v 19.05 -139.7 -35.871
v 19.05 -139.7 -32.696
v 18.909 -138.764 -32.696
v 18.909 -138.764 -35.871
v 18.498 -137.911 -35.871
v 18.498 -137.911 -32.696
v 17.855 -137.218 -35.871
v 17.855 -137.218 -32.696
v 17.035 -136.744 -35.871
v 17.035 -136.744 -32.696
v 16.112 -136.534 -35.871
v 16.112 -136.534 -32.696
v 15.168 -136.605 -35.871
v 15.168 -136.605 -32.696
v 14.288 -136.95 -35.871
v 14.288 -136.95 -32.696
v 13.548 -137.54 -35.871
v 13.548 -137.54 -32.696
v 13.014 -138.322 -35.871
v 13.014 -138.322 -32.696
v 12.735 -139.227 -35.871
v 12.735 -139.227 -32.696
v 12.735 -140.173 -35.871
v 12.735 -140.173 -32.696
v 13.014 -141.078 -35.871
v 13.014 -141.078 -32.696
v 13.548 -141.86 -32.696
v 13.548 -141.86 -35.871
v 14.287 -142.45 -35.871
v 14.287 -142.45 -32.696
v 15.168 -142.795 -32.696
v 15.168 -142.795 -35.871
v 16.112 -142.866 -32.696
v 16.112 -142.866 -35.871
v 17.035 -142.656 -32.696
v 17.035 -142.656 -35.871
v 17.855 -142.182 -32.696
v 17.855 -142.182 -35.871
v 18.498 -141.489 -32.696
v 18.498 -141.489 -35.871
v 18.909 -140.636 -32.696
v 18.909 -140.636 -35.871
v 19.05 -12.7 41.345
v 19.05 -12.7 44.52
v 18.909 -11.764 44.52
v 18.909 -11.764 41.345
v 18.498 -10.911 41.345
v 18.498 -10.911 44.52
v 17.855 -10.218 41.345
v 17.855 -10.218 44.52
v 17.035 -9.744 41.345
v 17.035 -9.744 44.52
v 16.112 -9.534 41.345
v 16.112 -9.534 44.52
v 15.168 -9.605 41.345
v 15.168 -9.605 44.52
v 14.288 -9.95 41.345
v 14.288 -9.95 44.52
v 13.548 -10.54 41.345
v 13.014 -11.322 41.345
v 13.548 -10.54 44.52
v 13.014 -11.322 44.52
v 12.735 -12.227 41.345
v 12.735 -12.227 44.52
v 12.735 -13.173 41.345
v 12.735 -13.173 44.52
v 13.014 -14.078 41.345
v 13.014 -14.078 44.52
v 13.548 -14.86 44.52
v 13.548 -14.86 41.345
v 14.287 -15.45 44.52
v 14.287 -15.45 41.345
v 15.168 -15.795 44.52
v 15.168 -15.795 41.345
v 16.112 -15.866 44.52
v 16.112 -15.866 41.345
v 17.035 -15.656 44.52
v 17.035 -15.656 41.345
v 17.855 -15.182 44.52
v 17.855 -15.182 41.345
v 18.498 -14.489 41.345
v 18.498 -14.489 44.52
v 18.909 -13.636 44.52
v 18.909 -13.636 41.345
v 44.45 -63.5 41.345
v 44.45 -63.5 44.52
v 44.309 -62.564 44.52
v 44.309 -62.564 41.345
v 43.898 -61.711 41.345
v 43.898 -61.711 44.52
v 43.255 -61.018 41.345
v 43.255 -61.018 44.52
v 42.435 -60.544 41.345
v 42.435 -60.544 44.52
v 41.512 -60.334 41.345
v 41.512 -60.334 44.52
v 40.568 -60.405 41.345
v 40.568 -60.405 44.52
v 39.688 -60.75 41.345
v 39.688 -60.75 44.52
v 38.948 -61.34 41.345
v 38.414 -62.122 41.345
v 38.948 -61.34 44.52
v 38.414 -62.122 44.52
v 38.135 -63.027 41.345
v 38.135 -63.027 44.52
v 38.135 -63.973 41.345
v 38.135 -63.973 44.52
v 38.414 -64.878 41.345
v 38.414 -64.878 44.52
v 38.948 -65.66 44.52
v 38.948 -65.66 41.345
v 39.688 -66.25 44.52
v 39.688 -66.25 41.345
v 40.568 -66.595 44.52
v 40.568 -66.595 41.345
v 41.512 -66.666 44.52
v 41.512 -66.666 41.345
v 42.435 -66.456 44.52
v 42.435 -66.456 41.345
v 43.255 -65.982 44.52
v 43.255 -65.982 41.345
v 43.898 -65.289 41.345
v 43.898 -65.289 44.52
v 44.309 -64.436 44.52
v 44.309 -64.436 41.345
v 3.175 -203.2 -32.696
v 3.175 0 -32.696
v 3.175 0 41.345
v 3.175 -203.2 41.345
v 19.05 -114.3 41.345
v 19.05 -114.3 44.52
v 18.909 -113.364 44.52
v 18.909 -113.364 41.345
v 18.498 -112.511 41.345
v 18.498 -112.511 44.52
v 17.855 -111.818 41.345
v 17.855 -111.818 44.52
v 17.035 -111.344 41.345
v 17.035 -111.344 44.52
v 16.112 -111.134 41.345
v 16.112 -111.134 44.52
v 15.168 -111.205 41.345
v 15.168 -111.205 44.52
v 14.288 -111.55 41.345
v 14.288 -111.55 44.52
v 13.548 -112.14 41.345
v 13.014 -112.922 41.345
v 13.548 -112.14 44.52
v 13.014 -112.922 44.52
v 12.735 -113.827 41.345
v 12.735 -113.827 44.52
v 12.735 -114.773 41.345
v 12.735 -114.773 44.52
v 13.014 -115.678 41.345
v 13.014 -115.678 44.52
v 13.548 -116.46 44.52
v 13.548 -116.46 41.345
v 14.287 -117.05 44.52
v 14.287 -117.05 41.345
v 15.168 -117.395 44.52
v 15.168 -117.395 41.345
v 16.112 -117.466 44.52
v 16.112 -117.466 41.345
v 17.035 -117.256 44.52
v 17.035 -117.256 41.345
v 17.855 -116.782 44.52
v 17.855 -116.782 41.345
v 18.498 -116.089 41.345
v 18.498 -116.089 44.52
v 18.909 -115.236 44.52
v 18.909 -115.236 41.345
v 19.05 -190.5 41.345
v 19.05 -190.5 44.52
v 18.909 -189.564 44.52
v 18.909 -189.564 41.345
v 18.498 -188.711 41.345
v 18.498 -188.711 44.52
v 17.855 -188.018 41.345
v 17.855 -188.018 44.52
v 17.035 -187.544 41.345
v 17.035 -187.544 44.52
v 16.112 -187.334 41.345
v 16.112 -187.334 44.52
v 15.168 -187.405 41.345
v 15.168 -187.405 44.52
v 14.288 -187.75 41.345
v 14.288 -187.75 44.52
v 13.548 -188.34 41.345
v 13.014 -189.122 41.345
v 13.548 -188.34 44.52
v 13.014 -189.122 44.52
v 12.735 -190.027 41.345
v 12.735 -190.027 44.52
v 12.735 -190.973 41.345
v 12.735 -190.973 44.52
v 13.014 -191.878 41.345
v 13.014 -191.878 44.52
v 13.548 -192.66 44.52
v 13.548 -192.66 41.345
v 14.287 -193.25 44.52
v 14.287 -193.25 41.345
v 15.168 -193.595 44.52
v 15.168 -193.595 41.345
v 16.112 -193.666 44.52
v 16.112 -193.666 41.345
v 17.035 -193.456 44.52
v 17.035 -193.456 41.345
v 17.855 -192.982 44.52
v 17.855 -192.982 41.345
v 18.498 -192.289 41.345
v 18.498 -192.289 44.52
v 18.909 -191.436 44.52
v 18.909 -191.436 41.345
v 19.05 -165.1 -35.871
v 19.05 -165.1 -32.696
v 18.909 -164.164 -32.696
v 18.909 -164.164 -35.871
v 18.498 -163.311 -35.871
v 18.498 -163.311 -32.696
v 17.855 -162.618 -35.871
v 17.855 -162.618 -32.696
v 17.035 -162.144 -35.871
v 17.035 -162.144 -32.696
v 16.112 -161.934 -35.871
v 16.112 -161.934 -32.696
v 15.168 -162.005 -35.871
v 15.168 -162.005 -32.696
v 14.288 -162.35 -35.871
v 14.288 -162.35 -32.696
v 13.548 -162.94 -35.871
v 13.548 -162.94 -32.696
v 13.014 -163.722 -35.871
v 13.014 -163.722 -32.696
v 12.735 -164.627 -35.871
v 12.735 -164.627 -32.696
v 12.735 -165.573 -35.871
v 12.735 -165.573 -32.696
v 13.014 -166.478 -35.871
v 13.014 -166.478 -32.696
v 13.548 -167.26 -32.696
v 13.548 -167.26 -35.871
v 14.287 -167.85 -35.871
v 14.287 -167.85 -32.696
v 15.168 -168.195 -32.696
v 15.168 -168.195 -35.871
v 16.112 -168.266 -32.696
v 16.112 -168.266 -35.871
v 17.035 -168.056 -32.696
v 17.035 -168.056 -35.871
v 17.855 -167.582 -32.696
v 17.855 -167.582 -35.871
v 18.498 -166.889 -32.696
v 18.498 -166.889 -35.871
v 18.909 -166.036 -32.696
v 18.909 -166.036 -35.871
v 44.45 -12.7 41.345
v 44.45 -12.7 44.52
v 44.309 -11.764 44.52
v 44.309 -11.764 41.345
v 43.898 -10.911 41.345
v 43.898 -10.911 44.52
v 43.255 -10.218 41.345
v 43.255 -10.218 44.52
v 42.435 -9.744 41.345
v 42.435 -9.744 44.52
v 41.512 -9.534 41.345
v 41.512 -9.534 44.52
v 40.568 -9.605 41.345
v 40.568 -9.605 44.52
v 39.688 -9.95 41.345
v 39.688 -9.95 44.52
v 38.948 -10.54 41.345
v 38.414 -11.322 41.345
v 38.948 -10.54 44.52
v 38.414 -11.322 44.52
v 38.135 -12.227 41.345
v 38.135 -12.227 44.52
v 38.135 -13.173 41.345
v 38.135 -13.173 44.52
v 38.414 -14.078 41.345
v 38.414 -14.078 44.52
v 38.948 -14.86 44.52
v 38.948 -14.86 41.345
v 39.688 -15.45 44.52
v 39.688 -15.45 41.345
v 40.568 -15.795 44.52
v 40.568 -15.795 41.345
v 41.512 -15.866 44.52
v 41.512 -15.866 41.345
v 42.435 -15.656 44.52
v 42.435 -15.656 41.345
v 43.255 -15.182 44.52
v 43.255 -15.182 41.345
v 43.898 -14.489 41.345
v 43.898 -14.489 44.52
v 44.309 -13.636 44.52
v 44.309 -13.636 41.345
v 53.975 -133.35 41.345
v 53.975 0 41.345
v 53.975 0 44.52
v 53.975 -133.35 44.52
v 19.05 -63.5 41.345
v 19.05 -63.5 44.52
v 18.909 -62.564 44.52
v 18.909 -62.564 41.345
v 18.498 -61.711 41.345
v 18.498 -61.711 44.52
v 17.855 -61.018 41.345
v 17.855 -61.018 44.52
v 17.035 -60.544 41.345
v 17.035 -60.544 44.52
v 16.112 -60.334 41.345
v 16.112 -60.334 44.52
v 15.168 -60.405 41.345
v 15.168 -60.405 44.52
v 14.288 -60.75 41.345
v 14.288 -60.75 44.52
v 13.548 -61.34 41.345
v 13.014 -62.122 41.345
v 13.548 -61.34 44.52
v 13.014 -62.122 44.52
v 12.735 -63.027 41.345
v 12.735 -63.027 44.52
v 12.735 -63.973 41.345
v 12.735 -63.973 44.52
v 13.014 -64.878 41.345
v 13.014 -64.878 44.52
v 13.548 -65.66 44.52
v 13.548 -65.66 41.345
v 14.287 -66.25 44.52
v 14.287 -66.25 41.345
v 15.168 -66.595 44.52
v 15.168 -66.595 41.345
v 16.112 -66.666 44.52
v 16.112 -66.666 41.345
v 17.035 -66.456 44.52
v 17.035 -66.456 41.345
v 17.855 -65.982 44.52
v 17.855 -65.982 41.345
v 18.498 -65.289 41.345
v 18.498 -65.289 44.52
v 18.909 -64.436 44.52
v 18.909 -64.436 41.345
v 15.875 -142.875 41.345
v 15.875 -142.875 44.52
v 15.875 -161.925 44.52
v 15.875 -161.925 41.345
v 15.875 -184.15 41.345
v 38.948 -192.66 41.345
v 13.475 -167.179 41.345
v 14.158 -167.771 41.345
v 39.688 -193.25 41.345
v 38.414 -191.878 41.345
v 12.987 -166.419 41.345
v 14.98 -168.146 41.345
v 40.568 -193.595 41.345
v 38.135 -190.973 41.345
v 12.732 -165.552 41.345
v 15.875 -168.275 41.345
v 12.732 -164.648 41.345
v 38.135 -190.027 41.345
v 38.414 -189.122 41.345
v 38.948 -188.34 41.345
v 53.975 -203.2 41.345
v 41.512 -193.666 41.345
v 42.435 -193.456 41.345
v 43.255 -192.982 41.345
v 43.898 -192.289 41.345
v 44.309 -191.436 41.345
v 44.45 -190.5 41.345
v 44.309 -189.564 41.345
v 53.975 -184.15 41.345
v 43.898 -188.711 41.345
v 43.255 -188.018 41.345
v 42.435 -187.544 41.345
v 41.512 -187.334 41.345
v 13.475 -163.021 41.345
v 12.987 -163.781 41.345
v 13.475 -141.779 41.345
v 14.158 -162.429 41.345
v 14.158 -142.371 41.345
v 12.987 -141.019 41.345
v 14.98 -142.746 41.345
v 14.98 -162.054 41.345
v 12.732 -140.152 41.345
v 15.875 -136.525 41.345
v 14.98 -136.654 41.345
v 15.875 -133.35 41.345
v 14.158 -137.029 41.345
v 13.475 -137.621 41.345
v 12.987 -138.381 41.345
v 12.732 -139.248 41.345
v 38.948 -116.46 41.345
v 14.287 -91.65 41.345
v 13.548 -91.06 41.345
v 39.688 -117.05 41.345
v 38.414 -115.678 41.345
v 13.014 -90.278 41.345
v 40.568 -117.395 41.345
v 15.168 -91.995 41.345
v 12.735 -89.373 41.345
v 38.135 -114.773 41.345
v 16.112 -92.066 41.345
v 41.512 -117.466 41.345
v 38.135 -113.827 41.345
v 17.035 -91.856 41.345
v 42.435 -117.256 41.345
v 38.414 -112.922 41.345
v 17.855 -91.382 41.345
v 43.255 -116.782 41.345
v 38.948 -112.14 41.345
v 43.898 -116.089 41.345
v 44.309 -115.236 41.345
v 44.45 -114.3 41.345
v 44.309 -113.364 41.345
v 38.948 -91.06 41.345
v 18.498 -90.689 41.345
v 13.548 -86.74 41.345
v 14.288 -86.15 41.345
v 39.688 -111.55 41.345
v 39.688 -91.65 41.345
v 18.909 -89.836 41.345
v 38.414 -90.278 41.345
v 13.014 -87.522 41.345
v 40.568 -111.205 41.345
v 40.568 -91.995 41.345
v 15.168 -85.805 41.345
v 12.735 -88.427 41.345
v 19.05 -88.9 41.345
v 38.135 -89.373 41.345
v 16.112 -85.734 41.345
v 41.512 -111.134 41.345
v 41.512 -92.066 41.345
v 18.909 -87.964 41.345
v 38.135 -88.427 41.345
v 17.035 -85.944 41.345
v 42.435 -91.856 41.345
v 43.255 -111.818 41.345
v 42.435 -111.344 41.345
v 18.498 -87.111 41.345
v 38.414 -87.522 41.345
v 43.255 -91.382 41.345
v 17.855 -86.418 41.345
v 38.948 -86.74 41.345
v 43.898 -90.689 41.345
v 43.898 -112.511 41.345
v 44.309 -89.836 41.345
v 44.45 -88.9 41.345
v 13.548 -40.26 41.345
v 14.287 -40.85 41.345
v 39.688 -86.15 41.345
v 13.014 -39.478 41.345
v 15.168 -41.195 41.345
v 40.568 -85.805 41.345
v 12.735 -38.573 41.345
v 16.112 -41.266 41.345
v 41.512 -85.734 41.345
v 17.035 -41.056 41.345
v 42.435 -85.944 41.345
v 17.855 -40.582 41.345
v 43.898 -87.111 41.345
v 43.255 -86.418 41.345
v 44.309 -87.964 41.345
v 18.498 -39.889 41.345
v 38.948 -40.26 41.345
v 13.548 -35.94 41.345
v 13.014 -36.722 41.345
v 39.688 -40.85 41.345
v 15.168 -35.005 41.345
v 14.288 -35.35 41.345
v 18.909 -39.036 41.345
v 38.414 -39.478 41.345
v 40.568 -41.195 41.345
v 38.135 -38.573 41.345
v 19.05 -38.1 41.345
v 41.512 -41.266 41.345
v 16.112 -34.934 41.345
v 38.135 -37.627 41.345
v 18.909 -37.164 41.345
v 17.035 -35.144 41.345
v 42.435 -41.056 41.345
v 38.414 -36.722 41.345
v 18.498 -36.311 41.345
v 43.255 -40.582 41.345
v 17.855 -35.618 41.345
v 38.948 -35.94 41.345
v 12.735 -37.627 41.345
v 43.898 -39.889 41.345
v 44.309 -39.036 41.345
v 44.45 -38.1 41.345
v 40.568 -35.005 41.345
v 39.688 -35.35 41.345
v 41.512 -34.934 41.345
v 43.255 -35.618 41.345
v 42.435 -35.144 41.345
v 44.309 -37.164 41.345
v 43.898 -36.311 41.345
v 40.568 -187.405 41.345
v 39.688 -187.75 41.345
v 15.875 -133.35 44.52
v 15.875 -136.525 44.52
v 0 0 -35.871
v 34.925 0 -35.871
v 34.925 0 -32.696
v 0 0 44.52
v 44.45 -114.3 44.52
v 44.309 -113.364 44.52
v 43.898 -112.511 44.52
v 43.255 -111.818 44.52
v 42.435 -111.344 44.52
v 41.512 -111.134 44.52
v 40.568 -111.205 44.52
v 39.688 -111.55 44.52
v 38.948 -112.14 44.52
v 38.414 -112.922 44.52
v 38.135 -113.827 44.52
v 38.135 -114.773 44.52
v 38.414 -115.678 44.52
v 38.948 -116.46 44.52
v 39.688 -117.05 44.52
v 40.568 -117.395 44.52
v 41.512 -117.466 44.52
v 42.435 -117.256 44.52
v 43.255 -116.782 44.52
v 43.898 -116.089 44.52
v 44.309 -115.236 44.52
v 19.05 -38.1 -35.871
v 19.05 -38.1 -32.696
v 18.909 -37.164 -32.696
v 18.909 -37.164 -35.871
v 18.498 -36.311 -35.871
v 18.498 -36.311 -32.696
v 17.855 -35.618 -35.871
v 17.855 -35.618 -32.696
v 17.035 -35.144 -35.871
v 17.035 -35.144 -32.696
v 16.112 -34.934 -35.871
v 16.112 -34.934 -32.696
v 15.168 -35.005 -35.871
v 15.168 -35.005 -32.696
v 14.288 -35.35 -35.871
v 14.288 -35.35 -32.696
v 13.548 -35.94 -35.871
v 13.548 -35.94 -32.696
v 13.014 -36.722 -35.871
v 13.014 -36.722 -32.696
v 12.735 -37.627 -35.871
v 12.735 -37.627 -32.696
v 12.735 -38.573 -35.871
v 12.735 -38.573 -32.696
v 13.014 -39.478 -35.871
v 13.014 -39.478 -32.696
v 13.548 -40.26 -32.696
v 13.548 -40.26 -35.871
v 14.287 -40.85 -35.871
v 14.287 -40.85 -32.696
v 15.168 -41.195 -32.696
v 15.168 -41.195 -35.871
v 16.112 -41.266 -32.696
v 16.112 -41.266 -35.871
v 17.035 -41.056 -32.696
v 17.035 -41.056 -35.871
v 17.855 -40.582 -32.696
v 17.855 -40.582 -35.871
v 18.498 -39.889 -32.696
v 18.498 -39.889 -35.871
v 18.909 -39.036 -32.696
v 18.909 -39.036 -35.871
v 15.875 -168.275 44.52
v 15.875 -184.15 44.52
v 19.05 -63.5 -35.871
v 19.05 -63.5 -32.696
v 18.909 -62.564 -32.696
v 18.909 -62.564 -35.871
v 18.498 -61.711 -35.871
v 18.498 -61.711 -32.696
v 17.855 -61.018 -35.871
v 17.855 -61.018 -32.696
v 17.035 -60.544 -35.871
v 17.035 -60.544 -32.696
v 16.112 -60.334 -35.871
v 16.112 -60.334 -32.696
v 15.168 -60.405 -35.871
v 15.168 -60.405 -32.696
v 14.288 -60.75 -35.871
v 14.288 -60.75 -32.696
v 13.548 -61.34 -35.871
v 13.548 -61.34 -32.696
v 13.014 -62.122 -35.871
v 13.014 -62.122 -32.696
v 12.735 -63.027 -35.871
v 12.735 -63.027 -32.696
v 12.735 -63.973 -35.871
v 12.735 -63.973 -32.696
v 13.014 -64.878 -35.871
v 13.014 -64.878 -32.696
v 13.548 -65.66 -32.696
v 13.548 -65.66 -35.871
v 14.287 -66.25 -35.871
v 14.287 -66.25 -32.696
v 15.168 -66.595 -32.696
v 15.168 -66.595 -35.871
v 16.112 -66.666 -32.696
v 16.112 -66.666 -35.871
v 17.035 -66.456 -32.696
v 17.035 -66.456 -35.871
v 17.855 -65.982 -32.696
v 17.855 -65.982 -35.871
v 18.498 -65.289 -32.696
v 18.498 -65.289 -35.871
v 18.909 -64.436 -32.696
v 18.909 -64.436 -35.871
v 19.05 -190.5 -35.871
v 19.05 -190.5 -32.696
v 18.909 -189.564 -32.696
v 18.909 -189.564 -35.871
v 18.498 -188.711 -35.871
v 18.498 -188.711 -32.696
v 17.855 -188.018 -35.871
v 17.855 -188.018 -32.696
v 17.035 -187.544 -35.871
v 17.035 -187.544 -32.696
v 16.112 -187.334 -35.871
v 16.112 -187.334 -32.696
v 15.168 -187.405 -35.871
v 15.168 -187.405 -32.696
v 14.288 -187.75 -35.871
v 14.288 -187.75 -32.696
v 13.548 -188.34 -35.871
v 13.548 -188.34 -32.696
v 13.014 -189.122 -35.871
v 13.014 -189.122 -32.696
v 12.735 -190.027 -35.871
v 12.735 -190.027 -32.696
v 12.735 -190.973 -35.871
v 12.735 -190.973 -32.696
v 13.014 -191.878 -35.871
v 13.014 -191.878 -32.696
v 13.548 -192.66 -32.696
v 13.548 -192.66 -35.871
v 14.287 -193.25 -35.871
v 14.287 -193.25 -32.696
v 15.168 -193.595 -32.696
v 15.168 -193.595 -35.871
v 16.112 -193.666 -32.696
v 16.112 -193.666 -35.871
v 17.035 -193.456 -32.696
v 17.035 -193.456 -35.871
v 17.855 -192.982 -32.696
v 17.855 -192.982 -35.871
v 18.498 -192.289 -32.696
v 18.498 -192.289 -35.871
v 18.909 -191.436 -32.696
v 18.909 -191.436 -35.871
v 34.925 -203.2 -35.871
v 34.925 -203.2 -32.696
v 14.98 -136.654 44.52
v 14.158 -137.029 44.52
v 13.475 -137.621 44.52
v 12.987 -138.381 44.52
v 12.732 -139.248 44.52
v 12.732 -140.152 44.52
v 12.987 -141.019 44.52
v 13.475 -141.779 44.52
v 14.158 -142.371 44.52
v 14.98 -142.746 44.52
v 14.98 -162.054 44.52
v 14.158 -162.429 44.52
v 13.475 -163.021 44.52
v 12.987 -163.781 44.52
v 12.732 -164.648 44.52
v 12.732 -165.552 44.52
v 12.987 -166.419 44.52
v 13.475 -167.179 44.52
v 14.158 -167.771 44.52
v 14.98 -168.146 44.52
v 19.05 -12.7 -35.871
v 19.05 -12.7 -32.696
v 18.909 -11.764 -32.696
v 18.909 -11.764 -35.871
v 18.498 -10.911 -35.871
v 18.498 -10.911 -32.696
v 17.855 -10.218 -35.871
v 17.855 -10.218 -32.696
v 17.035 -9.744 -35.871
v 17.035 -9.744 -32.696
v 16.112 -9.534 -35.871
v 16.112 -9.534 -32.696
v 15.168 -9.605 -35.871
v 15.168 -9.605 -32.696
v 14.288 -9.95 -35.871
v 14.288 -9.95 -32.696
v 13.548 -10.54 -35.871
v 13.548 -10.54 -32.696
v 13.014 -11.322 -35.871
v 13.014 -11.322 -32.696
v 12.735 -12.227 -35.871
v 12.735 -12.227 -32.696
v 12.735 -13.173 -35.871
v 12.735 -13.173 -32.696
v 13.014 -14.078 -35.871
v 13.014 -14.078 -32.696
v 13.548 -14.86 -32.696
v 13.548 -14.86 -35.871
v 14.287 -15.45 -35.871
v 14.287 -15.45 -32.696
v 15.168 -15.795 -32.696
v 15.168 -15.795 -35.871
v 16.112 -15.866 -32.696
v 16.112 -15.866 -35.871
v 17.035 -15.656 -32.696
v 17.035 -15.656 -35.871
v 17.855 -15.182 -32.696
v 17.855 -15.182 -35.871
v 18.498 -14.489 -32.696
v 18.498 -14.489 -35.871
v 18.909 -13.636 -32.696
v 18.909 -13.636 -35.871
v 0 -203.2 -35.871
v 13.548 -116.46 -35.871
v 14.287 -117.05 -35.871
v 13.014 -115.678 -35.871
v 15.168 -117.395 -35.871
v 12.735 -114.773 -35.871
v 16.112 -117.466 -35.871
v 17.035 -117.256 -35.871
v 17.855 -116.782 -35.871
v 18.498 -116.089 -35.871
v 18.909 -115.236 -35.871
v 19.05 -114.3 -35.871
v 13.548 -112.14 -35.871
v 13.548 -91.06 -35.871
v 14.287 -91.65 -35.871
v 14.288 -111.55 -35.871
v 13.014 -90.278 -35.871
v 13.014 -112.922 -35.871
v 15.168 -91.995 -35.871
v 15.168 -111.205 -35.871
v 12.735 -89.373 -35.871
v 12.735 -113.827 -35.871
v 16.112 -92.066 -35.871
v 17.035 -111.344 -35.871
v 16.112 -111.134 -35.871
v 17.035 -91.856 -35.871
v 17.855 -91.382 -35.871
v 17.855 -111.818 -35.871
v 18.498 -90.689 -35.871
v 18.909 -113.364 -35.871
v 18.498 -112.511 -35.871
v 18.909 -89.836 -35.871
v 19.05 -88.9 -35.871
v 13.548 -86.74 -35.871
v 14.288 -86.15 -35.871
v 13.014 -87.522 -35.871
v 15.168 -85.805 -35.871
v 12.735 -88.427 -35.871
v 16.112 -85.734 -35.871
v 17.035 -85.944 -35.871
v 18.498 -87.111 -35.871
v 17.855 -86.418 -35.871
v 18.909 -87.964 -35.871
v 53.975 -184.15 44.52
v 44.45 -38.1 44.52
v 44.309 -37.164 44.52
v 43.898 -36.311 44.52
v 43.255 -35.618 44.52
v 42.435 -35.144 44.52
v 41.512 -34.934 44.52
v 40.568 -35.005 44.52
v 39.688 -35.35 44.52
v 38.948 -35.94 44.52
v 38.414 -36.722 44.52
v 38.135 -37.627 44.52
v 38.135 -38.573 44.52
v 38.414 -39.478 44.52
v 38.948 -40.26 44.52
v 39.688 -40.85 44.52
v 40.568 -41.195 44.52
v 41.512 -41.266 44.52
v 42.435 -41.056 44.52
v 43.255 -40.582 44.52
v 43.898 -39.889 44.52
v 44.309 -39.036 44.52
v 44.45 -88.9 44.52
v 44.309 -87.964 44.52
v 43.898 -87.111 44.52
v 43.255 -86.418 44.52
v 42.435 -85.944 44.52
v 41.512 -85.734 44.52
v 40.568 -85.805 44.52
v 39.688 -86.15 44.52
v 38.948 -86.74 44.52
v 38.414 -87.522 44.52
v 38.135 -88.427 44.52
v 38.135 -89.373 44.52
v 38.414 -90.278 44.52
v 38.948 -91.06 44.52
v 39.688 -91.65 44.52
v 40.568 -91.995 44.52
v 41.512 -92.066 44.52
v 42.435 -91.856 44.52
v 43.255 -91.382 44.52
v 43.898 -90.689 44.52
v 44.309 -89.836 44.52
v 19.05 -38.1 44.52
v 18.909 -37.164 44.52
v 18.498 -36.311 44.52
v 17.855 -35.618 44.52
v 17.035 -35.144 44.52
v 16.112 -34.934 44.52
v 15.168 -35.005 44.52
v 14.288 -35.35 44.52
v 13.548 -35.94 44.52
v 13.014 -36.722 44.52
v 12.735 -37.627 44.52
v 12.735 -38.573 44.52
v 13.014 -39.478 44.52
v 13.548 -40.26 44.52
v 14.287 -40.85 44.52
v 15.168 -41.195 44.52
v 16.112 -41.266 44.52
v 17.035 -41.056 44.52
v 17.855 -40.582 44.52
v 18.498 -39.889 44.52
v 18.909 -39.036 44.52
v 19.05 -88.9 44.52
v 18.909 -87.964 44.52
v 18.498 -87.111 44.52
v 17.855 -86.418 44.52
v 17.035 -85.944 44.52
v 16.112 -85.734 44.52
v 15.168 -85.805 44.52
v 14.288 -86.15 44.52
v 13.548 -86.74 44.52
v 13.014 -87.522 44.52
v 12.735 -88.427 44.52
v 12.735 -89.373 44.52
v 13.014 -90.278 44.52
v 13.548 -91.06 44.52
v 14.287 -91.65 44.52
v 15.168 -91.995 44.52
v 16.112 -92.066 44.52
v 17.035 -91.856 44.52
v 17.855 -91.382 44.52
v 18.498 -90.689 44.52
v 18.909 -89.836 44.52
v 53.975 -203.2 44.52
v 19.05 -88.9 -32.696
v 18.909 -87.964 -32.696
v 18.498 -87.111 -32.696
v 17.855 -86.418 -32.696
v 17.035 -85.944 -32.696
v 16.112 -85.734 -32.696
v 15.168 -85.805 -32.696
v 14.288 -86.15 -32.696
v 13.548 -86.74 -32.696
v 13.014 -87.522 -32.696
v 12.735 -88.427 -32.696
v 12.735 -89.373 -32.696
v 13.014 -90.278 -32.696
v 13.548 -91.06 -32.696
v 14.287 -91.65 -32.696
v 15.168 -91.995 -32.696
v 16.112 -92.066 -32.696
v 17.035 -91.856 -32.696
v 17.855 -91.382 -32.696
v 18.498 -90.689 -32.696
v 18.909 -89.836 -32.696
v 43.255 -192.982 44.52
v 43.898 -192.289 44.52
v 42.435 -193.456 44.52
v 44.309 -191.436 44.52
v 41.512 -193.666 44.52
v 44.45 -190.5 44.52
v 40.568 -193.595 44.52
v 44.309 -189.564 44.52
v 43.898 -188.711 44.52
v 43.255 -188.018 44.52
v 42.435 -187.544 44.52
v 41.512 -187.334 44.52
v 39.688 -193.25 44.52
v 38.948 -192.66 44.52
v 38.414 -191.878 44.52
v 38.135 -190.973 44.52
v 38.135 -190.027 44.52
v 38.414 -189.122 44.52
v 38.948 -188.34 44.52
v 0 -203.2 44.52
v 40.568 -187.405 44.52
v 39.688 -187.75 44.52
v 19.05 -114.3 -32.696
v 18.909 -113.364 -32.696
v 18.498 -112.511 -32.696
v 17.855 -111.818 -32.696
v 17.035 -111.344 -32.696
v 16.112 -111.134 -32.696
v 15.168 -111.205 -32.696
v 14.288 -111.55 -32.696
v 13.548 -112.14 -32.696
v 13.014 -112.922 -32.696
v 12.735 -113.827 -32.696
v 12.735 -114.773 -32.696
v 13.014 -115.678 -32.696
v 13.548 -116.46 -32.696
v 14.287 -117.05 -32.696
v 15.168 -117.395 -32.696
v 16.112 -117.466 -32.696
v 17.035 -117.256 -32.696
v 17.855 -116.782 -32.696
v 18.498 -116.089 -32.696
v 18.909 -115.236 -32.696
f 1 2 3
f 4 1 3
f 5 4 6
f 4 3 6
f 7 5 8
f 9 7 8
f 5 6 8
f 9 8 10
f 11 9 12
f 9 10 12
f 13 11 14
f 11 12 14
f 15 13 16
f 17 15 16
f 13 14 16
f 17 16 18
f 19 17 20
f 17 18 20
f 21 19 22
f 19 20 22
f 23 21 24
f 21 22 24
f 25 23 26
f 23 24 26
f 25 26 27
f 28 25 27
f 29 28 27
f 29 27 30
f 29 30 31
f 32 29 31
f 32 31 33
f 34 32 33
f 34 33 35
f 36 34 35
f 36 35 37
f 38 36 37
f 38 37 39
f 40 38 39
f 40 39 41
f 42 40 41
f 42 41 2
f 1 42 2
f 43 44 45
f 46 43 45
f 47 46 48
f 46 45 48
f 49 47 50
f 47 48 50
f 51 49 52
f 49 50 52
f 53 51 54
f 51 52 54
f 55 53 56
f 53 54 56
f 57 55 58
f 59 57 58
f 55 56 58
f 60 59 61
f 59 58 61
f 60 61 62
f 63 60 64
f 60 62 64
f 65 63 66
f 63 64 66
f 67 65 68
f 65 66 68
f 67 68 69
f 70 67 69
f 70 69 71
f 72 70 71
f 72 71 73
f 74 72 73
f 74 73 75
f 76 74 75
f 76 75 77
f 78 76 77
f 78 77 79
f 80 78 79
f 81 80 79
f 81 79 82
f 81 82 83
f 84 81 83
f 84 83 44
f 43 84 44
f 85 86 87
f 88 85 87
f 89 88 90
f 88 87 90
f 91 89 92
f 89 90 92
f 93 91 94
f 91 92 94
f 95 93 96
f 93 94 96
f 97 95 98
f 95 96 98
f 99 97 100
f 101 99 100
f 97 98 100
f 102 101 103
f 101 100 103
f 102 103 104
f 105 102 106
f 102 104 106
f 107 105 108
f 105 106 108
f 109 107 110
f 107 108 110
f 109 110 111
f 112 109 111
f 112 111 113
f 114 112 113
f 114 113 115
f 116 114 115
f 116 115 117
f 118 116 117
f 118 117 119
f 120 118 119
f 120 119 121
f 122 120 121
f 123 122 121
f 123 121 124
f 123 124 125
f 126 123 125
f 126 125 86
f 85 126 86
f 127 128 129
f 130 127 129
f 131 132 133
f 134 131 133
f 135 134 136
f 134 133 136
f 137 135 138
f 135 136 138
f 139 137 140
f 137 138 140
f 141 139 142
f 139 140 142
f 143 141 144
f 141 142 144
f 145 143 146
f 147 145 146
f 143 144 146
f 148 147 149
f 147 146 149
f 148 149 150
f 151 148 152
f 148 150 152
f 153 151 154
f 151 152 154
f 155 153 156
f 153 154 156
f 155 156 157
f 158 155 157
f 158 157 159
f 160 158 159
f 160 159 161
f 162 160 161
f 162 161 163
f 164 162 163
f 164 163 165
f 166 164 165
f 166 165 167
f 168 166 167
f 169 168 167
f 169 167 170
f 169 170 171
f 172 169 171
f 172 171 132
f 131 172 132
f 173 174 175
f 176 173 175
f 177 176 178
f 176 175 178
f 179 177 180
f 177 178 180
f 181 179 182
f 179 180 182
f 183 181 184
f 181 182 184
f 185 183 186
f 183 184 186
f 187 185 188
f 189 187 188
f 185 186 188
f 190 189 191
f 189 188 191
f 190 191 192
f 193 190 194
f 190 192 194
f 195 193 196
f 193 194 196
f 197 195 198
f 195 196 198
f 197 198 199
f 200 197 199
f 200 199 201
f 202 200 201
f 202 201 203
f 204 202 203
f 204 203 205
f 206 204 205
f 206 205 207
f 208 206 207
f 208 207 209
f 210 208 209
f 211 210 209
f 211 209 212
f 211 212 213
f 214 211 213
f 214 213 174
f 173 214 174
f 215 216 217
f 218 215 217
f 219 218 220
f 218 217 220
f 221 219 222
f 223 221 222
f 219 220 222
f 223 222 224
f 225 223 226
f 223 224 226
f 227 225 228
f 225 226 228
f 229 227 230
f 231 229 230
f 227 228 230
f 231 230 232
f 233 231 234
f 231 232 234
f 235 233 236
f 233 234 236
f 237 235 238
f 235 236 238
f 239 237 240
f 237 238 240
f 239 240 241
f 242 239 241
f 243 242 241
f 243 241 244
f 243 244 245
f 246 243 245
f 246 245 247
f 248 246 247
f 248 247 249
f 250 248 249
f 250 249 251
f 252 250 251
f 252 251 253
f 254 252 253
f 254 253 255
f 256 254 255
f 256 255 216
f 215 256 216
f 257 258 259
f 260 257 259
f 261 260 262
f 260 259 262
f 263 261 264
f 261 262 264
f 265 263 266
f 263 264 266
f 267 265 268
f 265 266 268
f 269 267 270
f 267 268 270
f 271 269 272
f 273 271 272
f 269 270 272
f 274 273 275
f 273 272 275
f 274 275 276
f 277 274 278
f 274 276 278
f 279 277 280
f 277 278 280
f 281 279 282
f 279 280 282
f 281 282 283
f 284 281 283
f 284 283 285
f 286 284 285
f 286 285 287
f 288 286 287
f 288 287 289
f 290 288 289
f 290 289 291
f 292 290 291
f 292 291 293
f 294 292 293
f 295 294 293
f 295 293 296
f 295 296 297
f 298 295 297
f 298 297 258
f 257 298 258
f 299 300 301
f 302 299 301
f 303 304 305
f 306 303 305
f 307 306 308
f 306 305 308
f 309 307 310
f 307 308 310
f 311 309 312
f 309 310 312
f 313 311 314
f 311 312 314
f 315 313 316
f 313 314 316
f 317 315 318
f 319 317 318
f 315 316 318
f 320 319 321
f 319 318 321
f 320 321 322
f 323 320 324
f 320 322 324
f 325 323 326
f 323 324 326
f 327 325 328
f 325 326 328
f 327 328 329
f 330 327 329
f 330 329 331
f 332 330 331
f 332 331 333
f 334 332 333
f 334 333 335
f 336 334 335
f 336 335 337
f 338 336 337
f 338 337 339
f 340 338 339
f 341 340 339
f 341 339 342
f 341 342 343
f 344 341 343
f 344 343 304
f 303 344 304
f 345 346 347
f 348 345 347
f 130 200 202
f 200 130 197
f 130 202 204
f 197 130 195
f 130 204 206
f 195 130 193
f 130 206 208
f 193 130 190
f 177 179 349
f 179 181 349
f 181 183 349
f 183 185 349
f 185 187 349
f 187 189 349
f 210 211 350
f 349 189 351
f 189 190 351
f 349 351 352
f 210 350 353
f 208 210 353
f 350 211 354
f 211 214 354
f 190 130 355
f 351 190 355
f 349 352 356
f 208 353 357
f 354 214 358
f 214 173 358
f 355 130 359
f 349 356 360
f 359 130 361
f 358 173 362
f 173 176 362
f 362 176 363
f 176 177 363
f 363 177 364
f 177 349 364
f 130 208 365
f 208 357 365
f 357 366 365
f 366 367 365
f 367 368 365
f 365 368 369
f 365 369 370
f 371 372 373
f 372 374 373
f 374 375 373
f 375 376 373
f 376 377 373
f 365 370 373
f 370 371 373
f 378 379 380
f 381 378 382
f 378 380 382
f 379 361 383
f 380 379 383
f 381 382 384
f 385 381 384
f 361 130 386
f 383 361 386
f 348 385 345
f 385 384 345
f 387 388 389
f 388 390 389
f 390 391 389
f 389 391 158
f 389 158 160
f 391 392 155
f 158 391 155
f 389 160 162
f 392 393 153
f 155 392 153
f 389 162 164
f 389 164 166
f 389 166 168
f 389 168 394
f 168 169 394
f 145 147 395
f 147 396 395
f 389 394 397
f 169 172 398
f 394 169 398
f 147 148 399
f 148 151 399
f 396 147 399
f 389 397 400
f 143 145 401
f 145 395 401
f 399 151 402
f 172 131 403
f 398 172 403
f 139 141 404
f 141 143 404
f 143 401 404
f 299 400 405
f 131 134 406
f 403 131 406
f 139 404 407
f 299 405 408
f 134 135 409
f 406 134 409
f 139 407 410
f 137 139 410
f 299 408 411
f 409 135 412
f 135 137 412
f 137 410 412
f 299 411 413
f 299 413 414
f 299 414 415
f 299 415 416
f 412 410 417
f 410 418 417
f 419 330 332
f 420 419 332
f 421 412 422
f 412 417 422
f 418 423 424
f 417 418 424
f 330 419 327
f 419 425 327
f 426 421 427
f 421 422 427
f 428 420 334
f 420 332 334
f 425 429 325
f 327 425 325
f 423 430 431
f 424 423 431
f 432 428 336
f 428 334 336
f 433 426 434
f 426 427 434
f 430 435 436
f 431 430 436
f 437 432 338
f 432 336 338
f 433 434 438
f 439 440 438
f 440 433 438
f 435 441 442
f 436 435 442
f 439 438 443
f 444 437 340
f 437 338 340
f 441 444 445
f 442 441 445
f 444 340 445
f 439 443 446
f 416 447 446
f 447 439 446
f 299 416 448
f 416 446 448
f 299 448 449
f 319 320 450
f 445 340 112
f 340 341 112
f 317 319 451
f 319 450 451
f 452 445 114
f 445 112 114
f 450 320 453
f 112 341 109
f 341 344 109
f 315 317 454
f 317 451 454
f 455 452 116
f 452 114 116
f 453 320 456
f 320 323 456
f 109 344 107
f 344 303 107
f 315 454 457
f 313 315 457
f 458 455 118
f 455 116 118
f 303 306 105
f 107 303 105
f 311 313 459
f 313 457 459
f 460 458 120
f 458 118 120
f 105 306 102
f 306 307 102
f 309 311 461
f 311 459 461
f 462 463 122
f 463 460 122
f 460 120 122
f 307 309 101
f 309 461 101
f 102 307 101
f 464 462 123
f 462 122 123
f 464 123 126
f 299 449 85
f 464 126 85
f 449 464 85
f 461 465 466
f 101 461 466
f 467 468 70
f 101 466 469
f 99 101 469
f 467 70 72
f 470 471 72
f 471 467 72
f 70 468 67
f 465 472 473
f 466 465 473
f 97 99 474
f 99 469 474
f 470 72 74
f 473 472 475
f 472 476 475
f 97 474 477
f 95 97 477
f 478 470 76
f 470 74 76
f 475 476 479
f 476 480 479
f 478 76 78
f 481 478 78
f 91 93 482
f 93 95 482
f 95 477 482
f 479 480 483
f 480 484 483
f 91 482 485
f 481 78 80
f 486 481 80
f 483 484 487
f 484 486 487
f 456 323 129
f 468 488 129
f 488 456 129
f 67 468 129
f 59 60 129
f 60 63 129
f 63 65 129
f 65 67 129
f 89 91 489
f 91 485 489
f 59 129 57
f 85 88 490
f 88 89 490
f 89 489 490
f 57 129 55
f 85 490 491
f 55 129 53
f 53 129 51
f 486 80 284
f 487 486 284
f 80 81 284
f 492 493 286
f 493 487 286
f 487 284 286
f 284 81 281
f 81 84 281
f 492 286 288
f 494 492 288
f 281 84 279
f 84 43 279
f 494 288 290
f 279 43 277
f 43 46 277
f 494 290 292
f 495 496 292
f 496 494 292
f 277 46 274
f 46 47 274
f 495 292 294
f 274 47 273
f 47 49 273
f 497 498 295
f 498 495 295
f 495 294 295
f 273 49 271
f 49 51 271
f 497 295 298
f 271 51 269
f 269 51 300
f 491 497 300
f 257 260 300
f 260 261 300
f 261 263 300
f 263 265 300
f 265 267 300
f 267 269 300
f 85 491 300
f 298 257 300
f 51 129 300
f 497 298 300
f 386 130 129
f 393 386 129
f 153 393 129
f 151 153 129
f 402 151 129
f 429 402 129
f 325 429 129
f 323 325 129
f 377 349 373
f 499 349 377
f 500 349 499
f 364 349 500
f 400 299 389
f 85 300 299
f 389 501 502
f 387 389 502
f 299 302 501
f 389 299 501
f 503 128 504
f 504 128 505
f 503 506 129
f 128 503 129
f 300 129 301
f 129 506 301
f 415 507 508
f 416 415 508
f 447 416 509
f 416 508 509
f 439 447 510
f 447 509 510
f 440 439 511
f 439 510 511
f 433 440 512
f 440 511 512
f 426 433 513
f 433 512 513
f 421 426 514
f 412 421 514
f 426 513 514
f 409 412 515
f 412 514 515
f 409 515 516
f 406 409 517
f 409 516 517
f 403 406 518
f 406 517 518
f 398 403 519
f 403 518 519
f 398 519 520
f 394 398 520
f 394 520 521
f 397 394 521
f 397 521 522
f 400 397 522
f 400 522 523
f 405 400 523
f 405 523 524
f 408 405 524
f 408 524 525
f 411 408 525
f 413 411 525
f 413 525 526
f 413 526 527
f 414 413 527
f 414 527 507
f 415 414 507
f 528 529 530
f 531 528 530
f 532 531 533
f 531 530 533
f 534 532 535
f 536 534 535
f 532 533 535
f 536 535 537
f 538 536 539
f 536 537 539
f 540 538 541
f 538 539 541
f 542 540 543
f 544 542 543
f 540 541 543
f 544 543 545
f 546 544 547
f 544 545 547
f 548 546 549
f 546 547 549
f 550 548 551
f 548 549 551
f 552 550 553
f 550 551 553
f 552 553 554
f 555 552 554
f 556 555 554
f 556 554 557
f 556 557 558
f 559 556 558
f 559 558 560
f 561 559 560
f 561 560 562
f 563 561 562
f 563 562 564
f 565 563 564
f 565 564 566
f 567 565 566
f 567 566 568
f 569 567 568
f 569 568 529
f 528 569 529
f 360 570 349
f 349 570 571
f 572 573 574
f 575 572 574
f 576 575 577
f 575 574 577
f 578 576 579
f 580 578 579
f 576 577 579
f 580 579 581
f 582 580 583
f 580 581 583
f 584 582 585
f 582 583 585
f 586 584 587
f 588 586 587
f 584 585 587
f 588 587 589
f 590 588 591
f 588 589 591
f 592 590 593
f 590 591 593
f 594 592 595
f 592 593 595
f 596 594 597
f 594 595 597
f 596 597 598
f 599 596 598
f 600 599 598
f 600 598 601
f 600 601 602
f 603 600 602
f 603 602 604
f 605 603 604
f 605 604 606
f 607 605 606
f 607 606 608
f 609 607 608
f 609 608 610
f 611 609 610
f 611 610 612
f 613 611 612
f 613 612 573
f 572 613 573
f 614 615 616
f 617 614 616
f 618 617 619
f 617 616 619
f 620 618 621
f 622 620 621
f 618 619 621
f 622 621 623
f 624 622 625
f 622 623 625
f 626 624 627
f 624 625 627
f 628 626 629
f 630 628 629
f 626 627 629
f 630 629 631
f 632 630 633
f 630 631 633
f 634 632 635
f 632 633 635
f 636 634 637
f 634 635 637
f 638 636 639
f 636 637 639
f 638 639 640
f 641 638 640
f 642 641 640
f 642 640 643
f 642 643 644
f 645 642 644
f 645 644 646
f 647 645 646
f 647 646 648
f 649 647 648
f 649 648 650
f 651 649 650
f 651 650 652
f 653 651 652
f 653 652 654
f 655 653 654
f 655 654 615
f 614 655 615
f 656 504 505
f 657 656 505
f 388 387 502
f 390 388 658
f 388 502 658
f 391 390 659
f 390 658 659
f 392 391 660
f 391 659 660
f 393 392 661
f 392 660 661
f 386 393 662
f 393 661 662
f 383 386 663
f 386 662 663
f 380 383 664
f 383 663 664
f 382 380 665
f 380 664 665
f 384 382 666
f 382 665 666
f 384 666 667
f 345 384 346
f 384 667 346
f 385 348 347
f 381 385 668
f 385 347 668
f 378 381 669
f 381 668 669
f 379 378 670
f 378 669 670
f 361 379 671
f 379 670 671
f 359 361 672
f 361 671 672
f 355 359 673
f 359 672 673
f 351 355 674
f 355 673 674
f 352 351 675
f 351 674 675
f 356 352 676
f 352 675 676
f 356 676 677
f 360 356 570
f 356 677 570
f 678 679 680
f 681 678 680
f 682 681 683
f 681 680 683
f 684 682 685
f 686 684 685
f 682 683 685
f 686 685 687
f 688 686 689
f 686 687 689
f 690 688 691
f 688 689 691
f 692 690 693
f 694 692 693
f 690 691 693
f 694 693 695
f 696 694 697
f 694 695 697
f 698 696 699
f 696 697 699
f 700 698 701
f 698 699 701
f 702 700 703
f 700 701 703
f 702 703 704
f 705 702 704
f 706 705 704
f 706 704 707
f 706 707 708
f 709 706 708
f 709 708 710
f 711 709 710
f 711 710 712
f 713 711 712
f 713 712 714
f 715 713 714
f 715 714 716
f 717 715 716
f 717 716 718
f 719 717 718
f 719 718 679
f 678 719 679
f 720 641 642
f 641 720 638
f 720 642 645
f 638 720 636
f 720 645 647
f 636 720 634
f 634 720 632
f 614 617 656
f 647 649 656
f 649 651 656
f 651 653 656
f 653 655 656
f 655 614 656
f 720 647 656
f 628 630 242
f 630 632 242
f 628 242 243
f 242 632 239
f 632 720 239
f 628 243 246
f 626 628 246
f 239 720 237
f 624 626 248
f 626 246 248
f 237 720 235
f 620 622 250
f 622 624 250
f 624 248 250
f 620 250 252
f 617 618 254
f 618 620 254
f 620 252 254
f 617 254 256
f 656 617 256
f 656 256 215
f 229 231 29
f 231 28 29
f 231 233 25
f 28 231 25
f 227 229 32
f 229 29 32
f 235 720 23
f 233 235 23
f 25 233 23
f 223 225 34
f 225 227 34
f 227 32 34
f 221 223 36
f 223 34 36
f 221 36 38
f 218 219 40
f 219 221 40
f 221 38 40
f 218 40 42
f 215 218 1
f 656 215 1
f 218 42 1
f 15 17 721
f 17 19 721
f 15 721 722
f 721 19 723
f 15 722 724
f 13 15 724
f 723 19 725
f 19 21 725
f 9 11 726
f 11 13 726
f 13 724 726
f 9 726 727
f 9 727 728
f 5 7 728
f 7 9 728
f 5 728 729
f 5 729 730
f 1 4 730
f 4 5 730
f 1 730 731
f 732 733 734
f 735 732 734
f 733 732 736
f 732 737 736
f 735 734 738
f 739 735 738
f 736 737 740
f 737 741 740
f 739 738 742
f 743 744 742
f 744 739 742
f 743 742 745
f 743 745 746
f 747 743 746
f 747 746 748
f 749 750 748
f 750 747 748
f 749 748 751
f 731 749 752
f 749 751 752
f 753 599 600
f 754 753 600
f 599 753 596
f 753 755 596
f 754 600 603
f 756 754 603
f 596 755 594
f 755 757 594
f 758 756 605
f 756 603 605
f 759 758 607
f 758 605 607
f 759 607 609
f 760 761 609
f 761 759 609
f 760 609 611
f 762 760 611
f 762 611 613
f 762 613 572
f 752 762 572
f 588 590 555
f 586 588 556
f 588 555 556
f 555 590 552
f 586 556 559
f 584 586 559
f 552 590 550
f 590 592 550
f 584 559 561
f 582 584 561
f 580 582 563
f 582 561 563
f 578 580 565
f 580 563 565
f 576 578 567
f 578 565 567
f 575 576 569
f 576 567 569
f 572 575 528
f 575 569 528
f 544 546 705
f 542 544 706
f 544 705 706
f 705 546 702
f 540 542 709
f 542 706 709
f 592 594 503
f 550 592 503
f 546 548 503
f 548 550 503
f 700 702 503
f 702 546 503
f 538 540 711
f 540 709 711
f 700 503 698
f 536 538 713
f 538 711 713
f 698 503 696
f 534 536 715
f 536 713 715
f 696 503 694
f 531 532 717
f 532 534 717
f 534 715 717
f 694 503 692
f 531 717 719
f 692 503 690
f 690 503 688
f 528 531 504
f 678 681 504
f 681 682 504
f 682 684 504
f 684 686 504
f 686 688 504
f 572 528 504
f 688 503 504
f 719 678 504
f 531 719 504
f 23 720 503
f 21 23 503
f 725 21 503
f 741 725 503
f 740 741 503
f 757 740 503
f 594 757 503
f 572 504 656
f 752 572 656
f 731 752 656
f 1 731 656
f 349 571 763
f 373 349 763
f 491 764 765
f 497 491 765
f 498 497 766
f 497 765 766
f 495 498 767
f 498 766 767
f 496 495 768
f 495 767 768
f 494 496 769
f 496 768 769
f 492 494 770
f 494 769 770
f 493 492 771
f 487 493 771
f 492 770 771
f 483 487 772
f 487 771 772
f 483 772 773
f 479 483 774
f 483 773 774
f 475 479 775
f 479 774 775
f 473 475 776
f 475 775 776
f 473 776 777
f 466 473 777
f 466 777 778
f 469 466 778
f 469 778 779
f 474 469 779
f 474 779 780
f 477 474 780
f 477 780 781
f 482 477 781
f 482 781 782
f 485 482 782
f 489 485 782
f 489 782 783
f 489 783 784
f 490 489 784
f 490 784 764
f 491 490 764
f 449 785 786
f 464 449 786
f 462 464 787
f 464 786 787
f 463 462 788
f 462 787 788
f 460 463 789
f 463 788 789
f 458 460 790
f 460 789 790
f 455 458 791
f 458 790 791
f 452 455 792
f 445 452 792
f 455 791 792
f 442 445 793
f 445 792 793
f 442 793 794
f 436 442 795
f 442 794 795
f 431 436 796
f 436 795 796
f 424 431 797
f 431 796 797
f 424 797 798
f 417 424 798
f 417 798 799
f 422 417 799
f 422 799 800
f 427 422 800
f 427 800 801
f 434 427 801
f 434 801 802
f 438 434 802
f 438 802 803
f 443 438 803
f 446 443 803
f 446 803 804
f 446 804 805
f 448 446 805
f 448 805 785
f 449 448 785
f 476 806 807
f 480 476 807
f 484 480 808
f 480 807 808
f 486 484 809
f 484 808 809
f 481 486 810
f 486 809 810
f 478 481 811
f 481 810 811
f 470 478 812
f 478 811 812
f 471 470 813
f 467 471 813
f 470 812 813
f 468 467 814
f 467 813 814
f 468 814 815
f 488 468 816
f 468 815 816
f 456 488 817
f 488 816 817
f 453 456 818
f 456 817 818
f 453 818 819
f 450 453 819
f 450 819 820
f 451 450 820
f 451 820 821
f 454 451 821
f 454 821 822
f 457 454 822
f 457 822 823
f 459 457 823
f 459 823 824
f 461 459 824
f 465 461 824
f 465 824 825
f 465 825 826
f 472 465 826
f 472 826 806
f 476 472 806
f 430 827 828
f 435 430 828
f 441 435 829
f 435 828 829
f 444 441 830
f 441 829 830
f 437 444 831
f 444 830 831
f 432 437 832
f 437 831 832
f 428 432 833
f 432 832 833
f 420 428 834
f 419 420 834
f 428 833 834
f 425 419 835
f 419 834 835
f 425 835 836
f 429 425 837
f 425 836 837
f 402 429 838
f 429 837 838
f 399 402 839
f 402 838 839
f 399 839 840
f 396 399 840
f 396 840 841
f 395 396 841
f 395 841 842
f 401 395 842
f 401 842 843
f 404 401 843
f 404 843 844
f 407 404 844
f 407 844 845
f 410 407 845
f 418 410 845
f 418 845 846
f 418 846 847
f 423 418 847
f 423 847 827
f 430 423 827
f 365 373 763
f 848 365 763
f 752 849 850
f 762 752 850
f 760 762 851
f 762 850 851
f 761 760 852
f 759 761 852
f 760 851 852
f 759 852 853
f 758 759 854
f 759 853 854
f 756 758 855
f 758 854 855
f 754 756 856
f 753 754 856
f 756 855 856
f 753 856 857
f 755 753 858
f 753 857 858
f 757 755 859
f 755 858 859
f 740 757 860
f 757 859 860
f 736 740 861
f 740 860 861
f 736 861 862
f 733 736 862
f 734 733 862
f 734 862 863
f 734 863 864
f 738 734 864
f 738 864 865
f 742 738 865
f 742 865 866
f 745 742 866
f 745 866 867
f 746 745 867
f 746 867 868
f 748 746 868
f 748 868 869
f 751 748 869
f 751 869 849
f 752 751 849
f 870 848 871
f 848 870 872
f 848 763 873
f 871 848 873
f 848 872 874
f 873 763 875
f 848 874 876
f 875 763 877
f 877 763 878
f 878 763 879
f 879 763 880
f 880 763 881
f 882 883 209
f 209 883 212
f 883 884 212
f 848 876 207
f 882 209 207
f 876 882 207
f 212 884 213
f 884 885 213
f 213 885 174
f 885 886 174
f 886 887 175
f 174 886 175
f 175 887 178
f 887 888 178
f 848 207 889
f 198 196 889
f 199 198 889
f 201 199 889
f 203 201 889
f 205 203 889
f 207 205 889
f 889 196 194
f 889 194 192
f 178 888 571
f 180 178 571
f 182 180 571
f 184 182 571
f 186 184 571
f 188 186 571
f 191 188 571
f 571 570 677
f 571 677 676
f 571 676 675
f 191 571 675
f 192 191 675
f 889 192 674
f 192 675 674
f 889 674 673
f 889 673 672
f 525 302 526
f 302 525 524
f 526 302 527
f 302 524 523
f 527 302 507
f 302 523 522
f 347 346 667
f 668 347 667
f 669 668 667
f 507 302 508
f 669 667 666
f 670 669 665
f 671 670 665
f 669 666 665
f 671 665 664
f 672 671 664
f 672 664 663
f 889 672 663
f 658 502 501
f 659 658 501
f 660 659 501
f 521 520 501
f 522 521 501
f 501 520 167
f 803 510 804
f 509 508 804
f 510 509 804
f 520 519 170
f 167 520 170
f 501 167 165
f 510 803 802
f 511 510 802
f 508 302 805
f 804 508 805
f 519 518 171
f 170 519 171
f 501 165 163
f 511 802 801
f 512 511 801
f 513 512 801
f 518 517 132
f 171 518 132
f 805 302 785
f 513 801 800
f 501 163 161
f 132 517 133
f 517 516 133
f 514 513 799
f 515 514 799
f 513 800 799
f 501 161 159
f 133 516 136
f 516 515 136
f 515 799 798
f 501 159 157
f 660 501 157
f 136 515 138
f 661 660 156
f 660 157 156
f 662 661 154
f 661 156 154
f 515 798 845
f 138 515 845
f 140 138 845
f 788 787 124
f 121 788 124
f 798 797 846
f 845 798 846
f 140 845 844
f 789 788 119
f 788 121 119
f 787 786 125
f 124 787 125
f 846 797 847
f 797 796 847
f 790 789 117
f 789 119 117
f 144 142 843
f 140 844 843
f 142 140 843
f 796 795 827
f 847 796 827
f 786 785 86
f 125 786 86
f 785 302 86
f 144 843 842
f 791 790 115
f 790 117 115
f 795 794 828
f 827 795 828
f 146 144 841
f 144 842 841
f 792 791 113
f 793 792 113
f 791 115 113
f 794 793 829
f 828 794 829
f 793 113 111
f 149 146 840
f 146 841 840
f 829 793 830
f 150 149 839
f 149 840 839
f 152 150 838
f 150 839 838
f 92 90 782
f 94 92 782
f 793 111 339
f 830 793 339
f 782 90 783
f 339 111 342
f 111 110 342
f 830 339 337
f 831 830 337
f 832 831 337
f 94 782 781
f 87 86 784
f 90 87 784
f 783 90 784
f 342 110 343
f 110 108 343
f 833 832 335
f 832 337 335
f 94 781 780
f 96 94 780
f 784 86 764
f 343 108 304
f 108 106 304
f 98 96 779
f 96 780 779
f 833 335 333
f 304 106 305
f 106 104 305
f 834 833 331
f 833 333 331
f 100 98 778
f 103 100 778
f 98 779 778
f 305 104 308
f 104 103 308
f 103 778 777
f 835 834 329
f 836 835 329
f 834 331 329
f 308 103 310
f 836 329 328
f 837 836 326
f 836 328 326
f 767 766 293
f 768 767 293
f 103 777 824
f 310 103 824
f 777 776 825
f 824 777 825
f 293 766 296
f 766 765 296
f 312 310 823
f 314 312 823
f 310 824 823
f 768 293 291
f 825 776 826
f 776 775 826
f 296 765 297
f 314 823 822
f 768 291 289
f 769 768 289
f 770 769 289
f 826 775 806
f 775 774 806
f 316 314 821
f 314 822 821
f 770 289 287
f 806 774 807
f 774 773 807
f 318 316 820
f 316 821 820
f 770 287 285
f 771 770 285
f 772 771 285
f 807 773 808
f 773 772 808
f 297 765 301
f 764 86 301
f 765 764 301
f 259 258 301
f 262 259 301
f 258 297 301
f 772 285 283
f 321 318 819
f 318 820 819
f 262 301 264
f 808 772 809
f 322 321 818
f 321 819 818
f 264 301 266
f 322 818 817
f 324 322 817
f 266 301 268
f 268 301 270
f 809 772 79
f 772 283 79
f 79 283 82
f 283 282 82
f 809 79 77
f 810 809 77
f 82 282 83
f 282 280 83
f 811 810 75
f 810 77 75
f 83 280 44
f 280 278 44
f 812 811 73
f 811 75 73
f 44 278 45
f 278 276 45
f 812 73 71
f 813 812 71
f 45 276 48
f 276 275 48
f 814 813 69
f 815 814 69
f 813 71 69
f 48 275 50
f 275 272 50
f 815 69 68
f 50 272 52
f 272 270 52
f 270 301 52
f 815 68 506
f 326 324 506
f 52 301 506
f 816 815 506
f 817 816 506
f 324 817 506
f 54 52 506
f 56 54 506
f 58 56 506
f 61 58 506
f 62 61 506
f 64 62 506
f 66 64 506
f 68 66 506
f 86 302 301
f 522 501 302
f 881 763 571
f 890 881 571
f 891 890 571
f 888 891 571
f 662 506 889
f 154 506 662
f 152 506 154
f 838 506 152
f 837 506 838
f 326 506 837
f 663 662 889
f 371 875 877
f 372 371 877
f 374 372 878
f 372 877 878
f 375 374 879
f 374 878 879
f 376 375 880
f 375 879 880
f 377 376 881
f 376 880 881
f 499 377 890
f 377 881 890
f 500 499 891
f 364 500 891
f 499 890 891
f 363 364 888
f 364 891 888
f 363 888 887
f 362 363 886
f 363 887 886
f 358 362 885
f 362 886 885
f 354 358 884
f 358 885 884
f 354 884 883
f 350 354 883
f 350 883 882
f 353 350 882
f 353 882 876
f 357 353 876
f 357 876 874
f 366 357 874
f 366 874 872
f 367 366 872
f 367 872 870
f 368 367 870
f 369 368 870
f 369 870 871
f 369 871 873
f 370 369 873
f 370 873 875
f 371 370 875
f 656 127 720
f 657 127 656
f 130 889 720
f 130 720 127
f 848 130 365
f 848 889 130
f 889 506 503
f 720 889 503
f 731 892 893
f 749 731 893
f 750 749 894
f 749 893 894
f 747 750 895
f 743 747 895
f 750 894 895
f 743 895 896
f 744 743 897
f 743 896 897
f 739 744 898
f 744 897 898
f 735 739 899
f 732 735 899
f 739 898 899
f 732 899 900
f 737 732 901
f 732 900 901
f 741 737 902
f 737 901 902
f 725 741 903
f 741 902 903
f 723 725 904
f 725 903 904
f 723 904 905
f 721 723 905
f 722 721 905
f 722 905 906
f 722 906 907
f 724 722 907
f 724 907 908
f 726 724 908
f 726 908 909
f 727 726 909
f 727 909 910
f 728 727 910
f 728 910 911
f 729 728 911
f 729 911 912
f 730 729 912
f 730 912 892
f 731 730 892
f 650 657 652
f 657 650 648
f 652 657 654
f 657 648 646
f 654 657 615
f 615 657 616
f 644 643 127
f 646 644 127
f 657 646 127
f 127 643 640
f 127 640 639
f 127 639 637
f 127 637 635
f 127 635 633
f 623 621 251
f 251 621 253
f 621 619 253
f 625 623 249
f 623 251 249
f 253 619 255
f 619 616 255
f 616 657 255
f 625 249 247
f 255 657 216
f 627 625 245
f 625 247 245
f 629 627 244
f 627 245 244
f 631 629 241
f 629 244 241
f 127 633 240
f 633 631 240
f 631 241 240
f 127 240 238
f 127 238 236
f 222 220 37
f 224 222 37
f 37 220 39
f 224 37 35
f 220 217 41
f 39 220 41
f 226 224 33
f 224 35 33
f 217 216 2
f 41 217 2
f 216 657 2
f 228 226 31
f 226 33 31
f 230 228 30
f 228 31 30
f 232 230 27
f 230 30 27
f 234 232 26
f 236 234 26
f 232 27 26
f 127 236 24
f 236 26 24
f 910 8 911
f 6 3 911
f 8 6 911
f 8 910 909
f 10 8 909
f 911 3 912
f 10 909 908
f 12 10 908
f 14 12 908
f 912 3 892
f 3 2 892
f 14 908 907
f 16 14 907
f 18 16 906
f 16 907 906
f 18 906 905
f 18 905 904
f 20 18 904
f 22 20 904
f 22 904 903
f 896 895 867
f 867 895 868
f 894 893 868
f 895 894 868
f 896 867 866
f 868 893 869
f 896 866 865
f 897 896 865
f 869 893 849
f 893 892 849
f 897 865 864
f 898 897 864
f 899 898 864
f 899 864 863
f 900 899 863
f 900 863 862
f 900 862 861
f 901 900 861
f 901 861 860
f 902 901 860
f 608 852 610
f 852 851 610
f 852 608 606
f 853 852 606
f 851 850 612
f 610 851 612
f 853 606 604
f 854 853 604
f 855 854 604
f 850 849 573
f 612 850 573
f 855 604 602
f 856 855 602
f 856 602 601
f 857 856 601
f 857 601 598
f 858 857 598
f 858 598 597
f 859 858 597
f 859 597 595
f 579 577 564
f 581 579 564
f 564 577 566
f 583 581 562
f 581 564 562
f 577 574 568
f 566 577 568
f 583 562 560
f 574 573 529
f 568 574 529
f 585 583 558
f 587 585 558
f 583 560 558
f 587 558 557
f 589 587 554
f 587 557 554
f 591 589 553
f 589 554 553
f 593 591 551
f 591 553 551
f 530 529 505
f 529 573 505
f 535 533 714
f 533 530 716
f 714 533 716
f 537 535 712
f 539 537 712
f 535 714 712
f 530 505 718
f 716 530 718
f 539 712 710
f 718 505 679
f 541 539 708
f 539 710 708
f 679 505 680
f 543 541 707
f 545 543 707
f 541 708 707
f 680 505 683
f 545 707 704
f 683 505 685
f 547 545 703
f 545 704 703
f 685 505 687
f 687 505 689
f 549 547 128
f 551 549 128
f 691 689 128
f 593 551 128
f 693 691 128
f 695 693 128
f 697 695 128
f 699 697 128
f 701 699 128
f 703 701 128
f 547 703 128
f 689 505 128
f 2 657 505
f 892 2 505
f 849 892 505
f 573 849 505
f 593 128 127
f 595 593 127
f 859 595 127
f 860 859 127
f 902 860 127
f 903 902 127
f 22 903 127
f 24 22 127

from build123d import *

# Parameters (mm, degrees)
F1_DEPTH = 203.2
F2_R     = 3.175
F3_DEPTH = 101.6
F4_R     = 3.175
F5_DEPTH = 25.4


with BuildPart() as f1:
    # F0 (on Front) → F1 (new body)
    with BuildSketch(Plane.XZ):
        Polygon((53.975, 44.519556), (0, 44.519556), (0, -35.871444), (34.925, -35.871444), (34.925, -32.696444), (3.175, -32.696444), (3.175, 41.344556), (53.975, 41.344556), align=None)
    extrude(amount=F1_DEPTH)

    # F2 (on face) → F3 (cut)
    with BuildSketch(Plane.XY.offset(44.519556)):
        with Locations((41.275, -190.5)):
            Circle(F2_R)
        with Locations((41.275, -165.1)):
            Circle(F2_R)
        with Locations((41.275, -139.7)):
            Circle(F2_R)
        with Locations((41.275, -114.3)):
            Circle(F2_R)
        with Locations((41.275, -88.9)):
            Circle(F2_R)
        with Locations((41.275, -63.5)):
            Circle(F2_R)
        with Locations((41.275, -38.1)):
            Circle(F2_R)
        with Locations((41.275, -12.7)):
            Circle(F2_R)
        with Locations((15.875, -190.5)):
            Circle(F2_R)
        with Locations((15.875, -165.1)):
            Circle(F2_R)
        with Locations((15.875, -139.7)):
            Circle(F2_R)
        with Locations((15.875, -114.3)):
            Circle(F2_R)
        with Locations((15.875, -88.9)):
            Circle(F2_R)
        with Locations((15.875, -63.5)):
            Circle(F2_R)
        with Locations((15.875, -38.1)):
            Circle(F2_R)
        with Locations((15.875, -12.7)):
            Circle(F2_R)
    extrude(amount=-F3_DEPTH, mode=Mode.SUBTRACT)

    # F4 (on face) → F5 (cut)
    with BuildSketch(Plane.XY.offset(44.519556)):
        with BuildLine():
            Line((15.875, -184.15), (53.975, -184.15))
            Line((53.975, -184.15), (53.975, -133.35))
            Line((53.975, -133.35), (15.875, -133.35))
            Line((15.875, -133.35), (15.875, -136.525))
            ThreePointArc((15.875, -136.525), (18.120064, -137.454936), (19.05, -139.7))
            ThreePointArc((19.05, -139.7), (18.120064, -141.945064), (15.875, -142.875))
            Line((15.875, -142.875), (15.875, -161.925))
            ThreePointArc((15.875, -161.925), (18.120064, -162.854936), (19.05, -165.1))
            ThreePointArc((19.05, -165.1), (18.120064, -167.345064), (15.875, -168.275))
            Line((15.875, -168.275), (15.875, -184.15))
        make_face()
        with Locations((41.275, -165.1)):
            Circle(F4_R, mode=Mode.SUBTRACT)
        with Locations((41.275, -139.7)):
            Circle(F4_R, mode=Mode.SUBTRACT)
    extrude(amount=-F5_DEPTH, mode=Mode.SUBTRACT)


solid = f1.part
